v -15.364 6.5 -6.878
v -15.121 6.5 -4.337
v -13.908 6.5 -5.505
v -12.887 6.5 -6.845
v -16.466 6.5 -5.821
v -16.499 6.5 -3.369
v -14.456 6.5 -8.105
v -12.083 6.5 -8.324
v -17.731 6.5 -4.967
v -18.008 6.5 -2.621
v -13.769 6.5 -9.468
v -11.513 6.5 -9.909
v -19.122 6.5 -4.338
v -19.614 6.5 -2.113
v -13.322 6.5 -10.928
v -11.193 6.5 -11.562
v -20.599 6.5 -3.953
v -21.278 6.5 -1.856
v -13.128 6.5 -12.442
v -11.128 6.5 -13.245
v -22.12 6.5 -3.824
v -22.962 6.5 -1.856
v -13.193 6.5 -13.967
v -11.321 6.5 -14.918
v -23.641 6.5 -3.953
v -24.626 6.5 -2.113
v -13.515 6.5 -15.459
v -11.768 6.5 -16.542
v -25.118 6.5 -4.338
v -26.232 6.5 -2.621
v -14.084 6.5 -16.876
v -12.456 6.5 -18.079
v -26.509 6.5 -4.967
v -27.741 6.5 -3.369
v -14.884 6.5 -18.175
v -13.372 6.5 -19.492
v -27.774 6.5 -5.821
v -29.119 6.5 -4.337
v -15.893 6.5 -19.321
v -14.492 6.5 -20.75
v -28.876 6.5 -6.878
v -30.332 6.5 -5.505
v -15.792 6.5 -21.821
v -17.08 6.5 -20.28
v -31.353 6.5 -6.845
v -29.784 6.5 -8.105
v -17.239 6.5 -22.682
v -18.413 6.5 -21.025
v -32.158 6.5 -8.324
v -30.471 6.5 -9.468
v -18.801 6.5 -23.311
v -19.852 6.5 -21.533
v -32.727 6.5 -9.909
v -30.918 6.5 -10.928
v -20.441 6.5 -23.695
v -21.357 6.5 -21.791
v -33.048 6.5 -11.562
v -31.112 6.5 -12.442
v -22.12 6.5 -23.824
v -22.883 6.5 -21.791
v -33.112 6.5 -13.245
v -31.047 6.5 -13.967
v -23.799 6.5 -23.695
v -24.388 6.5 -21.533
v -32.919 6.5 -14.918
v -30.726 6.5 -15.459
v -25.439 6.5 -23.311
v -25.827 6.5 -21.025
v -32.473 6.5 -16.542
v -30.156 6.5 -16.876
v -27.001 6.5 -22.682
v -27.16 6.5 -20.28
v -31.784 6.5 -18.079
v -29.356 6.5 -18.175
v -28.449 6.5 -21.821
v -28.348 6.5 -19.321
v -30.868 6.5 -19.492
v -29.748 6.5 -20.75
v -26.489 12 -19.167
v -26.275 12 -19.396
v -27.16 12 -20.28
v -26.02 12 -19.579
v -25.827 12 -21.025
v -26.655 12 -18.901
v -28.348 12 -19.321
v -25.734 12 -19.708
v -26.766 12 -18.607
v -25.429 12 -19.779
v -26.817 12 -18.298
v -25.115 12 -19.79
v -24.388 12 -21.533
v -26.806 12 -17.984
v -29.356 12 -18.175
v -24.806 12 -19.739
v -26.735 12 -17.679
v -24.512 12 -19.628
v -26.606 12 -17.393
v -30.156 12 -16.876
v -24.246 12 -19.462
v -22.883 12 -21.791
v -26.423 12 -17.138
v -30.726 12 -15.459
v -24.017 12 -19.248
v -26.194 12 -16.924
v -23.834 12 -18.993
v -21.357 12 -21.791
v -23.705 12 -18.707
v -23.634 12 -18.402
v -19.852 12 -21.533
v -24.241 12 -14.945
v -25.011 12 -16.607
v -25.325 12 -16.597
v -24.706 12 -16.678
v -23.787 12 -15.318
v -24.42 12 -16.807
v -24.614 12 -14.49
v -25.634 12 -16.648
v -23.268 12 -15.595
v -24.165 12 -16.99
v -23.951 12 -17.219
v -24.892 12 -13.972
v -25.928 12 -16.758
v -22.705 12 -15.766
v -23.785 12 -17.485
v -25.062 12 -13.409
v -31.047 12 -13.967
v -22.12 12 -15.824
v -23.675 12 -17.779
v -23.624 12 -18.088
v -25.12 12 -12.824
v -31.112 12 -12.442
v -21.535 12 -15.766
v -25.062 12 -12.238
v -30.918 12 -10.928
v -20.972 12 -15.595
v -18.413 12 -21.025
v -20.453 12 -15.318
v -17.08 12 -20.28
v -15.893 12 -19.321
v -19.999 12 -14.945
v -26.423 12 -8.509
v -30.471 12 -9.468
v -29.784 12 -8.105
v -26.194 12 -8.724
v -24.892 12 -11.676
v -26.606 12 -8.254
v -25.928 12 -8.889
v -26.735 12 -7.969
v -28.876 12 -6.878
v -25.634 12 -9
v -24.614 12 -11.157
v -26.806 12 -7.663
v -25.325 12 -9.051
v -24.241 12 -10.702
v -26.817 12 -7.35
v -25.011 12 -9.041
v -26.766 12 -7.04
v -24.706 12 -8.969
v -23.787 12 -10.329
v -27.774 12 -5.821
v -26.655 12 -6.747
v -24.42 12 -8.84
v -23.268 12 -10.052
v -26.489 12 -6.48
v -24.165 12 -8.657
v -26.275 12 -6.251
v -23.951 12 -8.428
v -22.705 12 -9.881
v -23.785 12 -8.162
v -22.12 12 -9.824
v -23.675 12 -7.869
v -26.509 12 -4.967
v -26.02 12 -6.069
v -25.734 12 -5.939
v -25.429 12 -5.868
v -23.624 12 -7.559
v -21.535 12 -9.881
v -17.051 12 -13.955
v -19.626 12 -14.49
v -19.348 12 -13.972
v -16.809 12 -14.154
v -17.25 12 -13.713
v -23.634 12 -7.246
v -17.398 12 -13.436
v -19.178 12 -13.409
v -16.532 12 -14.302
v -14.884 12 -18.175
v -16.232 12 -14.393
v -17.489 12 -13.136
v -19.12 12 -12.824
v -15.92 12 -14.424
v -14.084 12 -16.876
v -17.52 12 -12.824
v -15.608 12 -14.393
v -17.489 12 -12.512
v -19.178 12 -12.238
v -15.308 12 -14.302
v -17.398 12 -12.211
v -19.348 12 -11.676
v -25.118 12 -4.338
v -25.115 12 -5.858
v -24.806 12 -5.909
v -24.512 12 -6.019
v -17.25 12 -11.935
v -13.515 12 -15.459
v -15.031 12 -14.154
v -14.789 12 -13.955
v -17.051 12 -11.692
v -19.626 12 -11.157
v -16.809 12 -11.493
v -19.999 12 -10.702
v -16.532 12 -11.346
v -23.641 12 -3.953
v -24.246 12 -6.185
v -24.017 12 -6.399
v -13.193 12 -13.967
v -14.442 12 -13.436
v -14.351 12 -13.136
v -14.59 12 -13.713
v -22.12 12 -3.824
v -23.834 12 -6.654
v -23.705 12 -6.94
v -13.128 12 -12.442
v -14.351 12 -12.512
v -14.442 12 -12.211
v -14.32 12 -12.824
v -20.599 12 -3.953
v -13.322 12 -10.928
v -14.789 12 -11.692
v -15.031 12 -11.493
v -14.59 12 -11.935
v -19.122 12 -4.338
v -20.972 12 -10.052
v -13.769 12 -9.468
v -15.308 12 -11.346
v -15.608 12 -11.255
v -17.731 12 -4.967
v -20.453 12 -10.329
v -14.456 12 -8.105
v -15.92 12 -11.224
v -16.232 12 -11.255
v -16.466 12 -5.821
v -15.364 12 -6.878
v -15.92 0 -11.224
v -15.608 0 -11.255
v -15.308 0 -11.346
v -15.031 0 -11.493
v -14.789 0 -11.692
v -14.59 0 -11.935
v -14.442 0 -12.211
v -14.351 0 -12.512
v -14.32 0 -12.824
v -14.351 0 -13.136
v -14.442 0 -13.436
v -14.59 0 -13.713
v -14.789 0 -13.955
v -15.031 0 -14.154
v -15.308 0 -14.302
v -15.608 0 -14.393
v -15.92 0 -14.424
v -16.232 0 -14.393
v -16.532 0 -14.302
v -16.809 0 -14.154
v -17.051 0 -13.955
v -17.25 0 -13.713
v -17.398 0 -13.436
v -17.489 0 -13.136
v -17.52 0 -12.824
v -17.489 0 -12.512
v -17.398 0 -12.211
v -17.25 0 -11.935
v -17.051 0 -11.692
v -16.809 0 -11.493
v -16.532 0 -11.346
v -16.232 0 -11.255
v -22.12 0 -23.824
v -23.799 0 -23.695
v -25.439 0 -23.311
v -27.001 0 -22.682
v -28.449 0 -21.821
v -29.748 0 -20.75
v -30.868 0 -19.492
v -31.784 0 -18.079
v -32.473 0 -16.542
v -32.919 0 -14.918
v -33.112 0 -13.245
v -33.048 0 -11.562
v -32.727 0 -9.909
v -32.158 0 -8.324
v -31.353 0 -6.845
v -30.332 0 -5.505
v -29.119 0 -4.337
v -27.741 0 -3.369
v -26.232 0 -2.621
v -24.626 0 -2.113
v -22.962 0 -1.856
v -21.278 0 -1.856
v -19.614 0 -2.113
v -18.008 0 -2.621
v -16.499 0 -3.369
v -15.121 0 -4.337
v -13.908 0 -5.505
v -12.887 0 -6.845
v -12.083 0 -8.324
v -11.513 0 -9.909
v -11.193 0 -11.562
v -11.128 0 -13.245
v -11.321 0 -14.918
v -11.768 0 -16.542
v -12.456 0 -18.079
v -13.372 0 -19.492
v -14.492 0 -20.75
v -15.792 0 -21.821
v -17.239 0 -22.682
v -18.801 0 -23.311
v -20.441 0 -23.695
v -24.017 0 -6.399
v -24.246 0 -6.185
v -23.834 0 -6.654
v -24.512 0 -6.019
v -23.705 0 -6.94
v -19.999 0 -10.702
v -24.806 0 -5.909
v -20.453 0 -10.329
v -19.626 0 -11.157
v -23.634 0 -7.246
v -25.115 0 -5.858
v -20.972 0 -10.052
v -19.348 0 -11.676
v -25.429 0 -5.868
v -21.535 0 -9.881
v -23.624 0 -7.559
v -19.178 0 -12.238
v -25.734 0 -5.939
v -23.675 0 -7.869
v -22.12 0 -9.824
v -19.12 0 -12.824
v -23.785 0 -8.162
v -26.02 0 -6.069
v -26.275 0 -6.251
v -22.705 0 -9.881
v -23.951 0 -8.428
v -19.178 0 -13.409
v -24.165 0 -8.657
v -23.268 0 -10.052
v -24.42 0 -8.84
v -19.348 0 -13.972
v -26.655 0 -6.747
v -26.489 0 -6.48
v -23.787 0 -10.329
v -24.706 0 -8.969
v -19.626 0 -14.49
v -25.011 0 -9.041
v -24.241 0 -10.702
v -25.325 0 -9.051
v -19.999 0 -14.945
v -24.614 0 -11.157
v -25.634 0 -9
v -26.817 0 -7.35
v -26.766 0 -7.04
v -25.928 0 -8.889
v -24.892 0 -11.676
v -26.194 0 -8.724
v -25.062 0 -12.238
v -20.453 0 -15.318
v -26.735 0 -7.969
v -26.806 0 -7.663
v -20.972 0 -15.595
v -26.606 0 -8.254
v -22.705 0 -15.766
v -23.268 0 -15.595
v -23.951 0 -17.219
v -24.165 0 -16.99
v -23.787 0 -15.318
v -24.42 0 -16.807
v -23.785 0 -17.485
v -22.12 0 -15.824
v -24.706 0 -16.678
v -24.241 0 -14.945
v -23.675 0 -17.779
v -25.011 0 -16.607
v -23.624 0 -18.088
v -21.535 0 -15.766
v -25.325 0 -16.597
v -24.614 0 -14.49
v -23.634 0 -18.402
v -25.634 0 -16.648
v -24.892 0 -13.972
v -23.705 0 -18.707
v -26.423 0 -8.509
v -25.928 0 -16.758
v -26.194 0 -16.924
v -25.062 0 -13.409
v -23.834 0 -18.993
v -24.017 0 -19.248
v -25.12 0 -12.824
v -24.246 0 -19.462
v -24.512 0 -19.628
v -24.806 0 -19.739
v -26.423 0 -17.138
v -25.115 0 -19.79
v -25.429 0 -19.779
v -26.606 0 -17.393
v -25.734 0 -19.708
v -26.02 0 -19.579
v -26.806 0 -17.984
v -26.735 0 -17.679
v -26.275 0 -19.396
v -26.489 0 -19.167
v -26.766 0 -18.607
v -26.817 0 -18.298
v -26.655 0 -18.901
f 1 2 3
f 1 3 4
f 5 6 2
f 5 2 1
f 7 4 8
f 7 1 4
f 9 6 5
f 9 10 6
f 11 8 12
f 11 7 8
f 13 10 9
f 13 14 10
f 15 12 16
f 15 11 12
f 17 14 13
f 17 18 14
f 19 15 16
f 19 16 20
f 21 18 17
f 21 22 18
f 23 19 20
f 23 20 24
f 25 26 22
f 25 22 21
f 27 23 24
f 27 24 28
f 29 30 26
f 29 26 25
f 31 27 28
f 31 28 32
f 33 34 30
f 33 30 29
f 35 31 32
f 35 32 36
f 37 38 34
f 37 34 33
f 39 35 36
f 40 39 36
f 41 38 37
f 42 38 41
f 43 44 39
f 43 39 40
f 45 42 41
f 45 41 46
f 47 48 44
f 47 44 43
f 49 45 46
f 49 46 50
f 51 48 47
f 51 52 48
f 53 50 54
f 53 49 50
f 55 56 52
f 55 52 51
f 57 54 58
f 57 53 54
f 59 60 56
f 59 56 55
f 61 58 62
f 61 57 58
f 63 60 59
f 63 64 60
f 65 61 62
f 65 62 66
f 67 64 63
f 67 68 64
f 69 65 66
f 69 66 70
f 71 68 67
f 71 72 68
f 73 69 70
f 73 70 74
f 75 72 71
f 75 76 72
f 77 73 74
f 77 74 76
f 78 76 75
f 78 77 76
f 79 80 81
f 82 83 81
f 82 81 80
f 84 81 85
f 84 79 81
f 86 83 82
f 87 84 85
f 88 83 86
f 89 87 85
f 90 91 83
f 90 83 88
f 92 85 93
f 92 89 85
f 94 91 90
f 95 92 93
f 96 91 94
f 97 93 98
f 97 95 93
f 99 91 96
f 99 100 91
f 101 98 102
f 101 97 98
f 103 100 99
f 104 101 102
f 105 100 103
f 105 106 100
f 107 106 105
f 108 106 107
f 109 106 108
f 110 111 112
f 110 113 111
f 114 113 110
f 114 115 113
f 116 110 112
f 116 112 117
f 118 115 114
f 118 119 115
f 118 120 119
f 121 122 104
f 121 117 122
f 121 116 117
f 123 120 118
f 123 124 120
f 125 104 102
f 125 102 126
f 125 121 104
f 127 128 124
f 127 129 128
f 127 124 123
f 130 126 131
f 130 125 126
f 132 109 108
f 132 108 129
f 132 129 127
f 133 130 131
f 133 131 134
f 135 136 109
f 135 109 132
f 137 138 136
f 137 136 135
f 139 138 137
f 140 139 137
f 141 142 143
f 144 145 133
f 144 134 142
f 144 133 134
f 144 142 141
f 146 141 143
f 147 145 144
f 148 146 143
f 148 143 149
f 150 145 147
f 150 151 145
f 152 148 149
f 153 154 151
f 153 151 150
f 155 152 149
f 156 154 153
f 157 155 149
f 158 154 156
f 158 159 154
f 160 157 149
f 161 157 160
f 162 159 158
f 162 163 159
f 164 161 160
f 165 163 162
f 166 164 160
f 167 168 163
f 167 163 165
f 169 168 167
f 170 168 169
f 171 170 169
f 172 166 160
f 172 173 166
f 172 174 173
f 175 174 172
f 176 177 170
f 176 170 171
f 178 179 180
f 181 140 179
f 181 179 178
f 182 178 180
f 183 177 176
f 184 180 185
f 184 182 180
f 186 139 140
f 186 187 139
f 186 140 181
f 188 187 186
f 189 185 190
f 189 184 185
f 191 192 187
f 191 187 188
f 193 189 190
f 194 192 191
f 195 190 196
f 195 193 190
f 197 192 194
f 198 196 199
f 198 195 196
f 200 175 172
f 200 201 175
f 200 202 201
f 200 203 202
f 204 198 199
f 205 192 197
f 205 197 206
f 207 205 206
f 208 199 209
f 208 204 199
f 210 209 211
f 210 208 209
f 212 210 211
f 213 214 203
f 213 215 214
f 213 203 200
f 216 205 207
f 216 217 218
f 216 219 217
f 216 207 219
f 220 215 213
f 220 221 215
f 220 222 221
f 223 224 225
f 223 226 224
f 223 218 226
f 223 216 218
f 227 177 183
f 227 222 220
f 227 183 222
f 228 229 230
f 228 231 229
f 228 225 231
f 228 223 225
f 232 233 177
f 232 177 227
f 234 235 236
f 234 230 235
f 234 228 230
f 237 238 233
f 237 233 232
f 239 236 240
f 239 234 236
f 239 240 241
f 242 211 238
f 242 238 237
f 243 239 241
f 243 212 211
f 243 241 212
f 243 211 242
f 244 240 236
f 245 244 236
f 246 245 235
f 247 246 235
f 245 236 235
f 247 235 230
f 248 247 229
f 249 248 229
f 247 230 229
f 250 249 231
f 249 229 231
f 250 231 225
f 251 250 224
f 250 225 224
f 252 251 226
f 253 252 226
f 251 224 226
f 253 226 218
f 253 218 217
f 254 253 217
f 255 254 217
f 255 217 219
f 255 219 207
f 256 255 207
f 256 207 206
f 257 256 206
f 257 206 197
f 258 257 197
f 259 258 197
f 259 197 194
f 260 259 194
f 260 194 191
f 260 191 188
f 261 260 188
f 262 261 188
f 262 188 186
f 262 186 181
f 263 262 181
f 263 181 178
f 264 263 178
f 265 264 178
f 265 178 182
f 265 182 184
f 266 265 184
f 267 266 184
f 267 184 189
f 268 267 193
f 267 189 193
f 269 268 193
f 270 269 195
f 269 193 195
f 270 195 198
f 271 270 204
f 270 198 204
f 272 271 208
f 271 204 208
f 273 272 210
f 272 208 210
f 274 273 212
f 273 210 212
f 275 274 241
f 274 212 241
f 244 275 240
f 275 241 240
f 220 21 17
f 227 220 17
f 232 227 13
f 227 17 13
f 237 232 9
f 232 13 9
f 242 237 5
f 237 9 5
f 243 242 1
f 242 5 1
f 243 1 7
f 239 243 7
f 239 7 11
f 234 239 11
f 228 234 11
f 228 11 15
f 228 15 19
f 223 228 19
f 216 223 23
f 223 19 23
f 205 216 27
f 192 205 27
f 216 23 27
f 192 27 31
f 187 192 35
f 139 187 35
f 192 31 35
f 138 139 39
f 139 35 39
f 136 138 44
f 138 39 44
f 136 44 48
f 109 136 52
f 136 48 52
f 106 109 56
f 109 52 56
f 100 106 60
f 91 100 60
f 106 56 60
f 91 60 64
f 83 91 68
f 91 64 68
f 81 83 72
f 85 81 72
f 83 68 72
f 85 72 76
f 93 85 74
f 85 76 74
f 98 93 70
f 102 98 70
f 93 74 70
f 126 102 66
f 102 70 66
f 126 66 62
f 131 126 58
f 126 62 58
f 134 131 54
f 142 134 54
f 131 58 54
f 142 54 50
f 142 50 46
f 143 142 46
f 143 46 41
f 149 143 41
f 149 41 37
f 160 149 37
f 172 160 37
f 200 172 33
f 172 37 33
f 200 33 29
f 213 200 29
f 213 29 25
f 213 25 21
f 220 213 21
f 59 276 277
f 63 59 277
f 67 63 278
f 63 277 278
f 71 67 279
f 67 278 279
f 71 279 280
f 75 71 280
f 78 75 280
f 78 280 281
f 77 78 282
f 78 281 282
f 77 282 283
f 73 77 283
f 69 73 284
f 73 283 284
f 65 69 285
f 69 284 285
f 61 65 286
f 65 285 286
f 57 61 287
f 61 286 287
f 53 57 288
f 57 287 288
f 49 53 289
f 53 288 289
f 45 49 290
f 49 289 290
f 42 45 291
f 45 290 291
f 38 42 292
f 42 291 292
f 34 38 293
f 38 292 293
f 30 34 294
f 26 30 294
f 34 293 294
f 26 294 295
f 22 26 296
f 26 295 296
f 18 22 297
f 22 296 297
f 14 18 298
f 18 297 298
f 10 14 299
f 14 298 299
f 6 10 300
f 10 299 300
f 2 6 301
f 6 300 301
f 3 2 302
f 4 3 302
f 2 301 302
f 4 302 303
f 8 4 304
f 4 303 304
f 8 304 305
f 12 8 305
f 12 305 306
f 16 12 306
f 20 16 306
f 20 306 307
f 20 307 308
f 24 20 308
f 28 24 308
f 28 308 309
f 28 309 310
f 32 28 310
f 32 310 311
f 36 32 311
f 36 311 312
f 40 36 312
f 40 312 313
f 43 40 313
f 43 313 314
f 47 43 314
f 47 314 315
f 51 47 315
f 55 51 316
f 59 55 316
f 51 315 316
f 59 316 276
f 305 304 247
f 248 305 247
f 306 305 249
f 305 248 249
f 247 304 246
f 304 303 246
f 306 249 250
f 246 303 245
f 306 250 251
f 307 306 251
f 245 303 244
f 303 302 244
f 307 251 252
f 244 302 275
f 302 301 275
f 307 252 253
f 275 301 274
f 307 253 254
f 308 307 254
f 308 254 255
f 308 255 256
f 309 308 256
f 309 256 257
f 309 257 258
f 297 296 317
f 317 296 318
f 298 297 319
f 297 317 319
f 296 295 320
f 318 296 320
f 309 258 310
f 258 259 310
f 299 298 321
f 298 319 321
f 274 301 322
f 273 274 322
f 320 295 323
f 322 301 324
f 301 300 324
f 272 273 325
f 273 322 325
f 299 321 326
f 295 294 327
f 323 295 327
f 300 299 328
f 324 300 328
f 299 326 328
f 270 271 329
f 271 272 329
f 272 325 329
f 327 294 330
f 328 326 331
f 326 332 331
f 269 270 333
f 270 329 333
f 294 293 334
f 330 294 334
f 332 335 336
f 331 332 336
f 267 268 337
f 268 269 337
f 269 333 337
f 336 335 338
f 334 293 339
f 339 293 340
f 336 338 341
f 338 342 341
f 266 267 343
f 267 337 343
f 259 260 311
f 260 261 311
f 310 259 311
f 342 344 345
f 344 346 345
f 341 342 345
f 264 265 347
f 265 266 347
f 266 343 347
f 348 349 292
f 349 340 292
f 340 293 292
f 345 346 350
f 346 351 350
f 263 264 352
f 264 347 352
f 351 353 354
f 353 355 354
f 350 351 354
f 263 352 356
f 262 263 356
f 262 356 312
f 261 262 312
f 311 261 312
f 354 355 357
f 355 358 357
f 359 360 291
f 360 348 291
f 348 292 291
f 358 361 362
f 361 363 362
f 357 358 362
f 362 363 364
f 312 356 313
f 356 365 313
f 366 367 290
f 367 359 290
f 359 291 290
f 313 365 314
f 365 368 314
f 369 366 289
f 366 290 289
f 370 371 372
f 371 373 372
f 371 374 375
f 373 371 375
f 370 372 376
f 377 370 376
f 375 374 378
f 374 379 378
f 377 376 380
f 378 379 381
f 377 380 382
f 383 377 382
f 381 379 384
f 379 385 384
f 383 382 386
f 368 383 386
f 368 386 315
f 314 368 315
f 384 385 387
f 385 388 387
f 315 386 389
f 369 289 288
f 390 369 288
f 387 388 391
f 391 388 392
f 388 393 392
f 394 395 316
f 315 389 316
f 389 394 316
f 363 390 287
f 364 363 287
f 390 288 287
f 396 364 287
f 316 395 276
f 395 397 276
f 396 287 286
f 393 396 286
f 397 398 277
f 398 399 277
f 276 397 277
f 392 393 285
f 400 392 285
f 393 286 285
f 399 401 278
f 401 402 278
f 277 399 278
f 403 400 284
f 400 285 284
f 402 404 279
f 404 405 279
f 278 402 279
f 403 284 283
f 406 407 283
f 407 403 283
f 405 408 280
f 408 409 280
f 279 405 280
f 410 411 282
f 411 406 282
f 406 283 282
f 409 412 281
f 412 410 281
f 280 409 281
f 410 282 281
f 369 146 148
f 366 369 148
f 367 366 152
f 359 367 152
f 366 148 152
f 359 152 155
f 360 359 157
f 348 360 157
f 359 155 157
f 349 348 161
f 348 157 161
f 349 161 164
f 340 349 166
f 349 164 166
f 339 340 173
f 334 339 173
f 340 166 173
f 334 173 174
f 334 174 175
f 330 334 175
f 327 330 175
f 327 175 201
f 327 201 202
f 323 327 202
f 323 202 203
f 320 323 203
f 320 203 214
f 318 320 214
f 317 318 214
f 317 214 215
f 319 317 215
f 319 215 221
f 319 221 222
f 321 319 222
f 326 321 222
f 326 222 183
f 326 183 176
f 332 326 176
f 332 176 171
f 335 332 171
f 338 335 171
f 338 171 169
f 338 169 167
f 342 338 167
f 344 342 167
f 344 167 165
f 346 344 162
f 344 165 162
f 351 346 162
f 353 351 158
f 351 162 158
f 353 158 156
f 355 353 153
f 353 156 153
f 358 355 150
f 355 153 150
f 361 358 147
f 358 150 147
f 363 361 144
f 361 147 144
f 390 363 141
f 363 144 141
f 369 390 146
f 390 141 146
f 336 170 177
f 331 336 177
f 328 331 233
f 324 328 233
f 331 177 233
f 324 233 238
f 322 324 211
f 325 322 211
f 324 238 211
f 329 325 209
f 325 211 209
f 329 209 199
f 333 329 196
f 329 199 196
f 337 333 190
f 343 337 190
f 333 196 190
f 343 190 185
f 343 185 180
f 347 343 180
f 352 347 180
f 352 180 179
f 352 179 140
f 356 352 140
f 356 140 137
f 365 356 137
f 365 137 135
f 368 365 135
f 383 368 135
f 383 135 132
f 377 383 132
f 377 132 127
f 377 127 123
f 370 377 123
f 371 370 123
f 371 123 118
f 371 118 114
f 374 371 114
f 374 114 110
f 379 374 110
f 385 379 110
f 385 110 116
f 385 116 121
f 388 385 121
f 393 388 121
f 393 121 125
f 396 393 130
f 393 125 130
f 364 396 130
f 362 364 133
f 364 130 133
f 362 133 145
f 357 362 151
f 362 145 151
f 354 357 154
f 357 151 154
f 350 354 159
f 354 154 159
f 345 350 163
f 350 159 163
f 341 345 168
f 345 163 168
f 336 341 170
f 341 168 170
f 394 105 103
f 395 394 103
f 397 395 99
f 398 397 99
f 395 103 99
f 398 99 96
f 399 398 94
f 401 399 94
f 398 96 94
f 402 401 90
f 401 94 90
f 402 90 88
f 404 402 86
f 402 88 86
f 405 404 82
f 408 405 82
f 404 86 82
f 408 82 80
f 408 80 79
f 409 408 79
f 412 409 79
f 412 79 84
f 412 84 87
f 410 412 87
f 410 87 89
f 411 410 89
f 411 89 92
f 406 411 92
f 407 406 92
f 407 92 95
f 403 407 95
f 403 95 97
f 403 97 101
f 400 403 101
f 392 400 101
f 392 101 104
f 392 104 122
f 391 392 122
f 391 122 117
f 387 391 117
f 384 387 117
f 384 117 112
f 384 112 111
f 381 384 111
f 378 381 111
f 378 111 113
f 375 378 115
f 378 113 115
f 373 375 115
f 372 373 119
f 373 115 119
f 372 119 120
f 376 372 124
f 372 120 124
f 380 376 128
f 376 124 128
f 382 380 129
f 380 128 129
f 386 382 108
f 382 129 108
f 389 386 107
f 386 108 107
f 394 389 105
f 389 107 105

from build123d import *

# Parameters (mm, degrees)
SKETCH1_R           = 11
BOSS_EXTRUDE1_DEPTH = 6.5
SKETCH2_R           = 9
BOSS_EXTRUDE2_DEPTH = 5.5
SKETCH3_R           = 3
CUT_EXTRUDE1_DEPTH  = 15.5
SKETCH4_R           = 1.6
CUT_EXTRUDE2_DEPTH  = 15.5
CIRPATTERN1_COUNT   = 3


with BuildPart() as part:
    # Sketch1 → Boss-Extrude1 (new body)
    with BuildSketch(Plane(origin=(0, 0, 0), x_dir=(1, 0, 0), z_dir=(0, 1, 0))):
        with Locations(Location((-22.120080678, 12.823767702, 0), (0, 0, 90))):
            Circle(SKETCH1_R)
    extrude(amount=BOSS_EXTRUDE1_DEPTH)

    # Sketch2 → Boss-Extrude2 (add)
    with BuildSketch(Plane(origin=(0, 6.5, 0), x_dir=(1, 0, 0), z_dir=(0, 1, 0))):
        with Locations(Location((-22.120080678, 12.823767702, 0), (0, 0, 270))):
            Circle(SKETCH2_R)
    extrude(amount=BOSS_EXTRUDE2_DEPTH)

    # Sketch3 → Cut-Extrude1 (cut)
    with BuildSketch(Plane(origin=(0, 12, 0), x_dir=(1, 0, 0), z_dir=(0, 1, 0))):
        with Locations(Location((-22.120080678, 12.823767702, 0), (0, 0, 270))):
            Circle(SKETCH3_R)
    extrude(amount=-CUT_EXTRUDE1_DEPTH, mode=Mode.SUBTRACT)

    # Sketch4 → Cut-Extrude2 (cut)
    with BuildSketch(Plane(origin=(0, 12, 0), x_dir=(1, 0, 0), z_dir=(0, 1, 0))):
        with Locations(Location((-15.920080678, 12.823767702, 0), (0, 0, 270))):
            Circle(SKETCH4_R)
    cut_extrude2 = extrude(amount=-CUT_EXTRUDE2_DEPTH, mode=Mode.SUBTRACT)

    # CirPattern1: Cut-Extrude2 ×3 about axis
    cirpattern1_axis = Axis((-22.120080678, 0, -12.823767702), (0, 1, 0))
    for i in range(1, CIRPATTERN1_COUNT):
        add(cut_extrude2.rotate(cirpattern1_axis, i * 360 / CIRPATTERN1_COUNT), mode=Mode.SUBTRACT)


solid = part.part
